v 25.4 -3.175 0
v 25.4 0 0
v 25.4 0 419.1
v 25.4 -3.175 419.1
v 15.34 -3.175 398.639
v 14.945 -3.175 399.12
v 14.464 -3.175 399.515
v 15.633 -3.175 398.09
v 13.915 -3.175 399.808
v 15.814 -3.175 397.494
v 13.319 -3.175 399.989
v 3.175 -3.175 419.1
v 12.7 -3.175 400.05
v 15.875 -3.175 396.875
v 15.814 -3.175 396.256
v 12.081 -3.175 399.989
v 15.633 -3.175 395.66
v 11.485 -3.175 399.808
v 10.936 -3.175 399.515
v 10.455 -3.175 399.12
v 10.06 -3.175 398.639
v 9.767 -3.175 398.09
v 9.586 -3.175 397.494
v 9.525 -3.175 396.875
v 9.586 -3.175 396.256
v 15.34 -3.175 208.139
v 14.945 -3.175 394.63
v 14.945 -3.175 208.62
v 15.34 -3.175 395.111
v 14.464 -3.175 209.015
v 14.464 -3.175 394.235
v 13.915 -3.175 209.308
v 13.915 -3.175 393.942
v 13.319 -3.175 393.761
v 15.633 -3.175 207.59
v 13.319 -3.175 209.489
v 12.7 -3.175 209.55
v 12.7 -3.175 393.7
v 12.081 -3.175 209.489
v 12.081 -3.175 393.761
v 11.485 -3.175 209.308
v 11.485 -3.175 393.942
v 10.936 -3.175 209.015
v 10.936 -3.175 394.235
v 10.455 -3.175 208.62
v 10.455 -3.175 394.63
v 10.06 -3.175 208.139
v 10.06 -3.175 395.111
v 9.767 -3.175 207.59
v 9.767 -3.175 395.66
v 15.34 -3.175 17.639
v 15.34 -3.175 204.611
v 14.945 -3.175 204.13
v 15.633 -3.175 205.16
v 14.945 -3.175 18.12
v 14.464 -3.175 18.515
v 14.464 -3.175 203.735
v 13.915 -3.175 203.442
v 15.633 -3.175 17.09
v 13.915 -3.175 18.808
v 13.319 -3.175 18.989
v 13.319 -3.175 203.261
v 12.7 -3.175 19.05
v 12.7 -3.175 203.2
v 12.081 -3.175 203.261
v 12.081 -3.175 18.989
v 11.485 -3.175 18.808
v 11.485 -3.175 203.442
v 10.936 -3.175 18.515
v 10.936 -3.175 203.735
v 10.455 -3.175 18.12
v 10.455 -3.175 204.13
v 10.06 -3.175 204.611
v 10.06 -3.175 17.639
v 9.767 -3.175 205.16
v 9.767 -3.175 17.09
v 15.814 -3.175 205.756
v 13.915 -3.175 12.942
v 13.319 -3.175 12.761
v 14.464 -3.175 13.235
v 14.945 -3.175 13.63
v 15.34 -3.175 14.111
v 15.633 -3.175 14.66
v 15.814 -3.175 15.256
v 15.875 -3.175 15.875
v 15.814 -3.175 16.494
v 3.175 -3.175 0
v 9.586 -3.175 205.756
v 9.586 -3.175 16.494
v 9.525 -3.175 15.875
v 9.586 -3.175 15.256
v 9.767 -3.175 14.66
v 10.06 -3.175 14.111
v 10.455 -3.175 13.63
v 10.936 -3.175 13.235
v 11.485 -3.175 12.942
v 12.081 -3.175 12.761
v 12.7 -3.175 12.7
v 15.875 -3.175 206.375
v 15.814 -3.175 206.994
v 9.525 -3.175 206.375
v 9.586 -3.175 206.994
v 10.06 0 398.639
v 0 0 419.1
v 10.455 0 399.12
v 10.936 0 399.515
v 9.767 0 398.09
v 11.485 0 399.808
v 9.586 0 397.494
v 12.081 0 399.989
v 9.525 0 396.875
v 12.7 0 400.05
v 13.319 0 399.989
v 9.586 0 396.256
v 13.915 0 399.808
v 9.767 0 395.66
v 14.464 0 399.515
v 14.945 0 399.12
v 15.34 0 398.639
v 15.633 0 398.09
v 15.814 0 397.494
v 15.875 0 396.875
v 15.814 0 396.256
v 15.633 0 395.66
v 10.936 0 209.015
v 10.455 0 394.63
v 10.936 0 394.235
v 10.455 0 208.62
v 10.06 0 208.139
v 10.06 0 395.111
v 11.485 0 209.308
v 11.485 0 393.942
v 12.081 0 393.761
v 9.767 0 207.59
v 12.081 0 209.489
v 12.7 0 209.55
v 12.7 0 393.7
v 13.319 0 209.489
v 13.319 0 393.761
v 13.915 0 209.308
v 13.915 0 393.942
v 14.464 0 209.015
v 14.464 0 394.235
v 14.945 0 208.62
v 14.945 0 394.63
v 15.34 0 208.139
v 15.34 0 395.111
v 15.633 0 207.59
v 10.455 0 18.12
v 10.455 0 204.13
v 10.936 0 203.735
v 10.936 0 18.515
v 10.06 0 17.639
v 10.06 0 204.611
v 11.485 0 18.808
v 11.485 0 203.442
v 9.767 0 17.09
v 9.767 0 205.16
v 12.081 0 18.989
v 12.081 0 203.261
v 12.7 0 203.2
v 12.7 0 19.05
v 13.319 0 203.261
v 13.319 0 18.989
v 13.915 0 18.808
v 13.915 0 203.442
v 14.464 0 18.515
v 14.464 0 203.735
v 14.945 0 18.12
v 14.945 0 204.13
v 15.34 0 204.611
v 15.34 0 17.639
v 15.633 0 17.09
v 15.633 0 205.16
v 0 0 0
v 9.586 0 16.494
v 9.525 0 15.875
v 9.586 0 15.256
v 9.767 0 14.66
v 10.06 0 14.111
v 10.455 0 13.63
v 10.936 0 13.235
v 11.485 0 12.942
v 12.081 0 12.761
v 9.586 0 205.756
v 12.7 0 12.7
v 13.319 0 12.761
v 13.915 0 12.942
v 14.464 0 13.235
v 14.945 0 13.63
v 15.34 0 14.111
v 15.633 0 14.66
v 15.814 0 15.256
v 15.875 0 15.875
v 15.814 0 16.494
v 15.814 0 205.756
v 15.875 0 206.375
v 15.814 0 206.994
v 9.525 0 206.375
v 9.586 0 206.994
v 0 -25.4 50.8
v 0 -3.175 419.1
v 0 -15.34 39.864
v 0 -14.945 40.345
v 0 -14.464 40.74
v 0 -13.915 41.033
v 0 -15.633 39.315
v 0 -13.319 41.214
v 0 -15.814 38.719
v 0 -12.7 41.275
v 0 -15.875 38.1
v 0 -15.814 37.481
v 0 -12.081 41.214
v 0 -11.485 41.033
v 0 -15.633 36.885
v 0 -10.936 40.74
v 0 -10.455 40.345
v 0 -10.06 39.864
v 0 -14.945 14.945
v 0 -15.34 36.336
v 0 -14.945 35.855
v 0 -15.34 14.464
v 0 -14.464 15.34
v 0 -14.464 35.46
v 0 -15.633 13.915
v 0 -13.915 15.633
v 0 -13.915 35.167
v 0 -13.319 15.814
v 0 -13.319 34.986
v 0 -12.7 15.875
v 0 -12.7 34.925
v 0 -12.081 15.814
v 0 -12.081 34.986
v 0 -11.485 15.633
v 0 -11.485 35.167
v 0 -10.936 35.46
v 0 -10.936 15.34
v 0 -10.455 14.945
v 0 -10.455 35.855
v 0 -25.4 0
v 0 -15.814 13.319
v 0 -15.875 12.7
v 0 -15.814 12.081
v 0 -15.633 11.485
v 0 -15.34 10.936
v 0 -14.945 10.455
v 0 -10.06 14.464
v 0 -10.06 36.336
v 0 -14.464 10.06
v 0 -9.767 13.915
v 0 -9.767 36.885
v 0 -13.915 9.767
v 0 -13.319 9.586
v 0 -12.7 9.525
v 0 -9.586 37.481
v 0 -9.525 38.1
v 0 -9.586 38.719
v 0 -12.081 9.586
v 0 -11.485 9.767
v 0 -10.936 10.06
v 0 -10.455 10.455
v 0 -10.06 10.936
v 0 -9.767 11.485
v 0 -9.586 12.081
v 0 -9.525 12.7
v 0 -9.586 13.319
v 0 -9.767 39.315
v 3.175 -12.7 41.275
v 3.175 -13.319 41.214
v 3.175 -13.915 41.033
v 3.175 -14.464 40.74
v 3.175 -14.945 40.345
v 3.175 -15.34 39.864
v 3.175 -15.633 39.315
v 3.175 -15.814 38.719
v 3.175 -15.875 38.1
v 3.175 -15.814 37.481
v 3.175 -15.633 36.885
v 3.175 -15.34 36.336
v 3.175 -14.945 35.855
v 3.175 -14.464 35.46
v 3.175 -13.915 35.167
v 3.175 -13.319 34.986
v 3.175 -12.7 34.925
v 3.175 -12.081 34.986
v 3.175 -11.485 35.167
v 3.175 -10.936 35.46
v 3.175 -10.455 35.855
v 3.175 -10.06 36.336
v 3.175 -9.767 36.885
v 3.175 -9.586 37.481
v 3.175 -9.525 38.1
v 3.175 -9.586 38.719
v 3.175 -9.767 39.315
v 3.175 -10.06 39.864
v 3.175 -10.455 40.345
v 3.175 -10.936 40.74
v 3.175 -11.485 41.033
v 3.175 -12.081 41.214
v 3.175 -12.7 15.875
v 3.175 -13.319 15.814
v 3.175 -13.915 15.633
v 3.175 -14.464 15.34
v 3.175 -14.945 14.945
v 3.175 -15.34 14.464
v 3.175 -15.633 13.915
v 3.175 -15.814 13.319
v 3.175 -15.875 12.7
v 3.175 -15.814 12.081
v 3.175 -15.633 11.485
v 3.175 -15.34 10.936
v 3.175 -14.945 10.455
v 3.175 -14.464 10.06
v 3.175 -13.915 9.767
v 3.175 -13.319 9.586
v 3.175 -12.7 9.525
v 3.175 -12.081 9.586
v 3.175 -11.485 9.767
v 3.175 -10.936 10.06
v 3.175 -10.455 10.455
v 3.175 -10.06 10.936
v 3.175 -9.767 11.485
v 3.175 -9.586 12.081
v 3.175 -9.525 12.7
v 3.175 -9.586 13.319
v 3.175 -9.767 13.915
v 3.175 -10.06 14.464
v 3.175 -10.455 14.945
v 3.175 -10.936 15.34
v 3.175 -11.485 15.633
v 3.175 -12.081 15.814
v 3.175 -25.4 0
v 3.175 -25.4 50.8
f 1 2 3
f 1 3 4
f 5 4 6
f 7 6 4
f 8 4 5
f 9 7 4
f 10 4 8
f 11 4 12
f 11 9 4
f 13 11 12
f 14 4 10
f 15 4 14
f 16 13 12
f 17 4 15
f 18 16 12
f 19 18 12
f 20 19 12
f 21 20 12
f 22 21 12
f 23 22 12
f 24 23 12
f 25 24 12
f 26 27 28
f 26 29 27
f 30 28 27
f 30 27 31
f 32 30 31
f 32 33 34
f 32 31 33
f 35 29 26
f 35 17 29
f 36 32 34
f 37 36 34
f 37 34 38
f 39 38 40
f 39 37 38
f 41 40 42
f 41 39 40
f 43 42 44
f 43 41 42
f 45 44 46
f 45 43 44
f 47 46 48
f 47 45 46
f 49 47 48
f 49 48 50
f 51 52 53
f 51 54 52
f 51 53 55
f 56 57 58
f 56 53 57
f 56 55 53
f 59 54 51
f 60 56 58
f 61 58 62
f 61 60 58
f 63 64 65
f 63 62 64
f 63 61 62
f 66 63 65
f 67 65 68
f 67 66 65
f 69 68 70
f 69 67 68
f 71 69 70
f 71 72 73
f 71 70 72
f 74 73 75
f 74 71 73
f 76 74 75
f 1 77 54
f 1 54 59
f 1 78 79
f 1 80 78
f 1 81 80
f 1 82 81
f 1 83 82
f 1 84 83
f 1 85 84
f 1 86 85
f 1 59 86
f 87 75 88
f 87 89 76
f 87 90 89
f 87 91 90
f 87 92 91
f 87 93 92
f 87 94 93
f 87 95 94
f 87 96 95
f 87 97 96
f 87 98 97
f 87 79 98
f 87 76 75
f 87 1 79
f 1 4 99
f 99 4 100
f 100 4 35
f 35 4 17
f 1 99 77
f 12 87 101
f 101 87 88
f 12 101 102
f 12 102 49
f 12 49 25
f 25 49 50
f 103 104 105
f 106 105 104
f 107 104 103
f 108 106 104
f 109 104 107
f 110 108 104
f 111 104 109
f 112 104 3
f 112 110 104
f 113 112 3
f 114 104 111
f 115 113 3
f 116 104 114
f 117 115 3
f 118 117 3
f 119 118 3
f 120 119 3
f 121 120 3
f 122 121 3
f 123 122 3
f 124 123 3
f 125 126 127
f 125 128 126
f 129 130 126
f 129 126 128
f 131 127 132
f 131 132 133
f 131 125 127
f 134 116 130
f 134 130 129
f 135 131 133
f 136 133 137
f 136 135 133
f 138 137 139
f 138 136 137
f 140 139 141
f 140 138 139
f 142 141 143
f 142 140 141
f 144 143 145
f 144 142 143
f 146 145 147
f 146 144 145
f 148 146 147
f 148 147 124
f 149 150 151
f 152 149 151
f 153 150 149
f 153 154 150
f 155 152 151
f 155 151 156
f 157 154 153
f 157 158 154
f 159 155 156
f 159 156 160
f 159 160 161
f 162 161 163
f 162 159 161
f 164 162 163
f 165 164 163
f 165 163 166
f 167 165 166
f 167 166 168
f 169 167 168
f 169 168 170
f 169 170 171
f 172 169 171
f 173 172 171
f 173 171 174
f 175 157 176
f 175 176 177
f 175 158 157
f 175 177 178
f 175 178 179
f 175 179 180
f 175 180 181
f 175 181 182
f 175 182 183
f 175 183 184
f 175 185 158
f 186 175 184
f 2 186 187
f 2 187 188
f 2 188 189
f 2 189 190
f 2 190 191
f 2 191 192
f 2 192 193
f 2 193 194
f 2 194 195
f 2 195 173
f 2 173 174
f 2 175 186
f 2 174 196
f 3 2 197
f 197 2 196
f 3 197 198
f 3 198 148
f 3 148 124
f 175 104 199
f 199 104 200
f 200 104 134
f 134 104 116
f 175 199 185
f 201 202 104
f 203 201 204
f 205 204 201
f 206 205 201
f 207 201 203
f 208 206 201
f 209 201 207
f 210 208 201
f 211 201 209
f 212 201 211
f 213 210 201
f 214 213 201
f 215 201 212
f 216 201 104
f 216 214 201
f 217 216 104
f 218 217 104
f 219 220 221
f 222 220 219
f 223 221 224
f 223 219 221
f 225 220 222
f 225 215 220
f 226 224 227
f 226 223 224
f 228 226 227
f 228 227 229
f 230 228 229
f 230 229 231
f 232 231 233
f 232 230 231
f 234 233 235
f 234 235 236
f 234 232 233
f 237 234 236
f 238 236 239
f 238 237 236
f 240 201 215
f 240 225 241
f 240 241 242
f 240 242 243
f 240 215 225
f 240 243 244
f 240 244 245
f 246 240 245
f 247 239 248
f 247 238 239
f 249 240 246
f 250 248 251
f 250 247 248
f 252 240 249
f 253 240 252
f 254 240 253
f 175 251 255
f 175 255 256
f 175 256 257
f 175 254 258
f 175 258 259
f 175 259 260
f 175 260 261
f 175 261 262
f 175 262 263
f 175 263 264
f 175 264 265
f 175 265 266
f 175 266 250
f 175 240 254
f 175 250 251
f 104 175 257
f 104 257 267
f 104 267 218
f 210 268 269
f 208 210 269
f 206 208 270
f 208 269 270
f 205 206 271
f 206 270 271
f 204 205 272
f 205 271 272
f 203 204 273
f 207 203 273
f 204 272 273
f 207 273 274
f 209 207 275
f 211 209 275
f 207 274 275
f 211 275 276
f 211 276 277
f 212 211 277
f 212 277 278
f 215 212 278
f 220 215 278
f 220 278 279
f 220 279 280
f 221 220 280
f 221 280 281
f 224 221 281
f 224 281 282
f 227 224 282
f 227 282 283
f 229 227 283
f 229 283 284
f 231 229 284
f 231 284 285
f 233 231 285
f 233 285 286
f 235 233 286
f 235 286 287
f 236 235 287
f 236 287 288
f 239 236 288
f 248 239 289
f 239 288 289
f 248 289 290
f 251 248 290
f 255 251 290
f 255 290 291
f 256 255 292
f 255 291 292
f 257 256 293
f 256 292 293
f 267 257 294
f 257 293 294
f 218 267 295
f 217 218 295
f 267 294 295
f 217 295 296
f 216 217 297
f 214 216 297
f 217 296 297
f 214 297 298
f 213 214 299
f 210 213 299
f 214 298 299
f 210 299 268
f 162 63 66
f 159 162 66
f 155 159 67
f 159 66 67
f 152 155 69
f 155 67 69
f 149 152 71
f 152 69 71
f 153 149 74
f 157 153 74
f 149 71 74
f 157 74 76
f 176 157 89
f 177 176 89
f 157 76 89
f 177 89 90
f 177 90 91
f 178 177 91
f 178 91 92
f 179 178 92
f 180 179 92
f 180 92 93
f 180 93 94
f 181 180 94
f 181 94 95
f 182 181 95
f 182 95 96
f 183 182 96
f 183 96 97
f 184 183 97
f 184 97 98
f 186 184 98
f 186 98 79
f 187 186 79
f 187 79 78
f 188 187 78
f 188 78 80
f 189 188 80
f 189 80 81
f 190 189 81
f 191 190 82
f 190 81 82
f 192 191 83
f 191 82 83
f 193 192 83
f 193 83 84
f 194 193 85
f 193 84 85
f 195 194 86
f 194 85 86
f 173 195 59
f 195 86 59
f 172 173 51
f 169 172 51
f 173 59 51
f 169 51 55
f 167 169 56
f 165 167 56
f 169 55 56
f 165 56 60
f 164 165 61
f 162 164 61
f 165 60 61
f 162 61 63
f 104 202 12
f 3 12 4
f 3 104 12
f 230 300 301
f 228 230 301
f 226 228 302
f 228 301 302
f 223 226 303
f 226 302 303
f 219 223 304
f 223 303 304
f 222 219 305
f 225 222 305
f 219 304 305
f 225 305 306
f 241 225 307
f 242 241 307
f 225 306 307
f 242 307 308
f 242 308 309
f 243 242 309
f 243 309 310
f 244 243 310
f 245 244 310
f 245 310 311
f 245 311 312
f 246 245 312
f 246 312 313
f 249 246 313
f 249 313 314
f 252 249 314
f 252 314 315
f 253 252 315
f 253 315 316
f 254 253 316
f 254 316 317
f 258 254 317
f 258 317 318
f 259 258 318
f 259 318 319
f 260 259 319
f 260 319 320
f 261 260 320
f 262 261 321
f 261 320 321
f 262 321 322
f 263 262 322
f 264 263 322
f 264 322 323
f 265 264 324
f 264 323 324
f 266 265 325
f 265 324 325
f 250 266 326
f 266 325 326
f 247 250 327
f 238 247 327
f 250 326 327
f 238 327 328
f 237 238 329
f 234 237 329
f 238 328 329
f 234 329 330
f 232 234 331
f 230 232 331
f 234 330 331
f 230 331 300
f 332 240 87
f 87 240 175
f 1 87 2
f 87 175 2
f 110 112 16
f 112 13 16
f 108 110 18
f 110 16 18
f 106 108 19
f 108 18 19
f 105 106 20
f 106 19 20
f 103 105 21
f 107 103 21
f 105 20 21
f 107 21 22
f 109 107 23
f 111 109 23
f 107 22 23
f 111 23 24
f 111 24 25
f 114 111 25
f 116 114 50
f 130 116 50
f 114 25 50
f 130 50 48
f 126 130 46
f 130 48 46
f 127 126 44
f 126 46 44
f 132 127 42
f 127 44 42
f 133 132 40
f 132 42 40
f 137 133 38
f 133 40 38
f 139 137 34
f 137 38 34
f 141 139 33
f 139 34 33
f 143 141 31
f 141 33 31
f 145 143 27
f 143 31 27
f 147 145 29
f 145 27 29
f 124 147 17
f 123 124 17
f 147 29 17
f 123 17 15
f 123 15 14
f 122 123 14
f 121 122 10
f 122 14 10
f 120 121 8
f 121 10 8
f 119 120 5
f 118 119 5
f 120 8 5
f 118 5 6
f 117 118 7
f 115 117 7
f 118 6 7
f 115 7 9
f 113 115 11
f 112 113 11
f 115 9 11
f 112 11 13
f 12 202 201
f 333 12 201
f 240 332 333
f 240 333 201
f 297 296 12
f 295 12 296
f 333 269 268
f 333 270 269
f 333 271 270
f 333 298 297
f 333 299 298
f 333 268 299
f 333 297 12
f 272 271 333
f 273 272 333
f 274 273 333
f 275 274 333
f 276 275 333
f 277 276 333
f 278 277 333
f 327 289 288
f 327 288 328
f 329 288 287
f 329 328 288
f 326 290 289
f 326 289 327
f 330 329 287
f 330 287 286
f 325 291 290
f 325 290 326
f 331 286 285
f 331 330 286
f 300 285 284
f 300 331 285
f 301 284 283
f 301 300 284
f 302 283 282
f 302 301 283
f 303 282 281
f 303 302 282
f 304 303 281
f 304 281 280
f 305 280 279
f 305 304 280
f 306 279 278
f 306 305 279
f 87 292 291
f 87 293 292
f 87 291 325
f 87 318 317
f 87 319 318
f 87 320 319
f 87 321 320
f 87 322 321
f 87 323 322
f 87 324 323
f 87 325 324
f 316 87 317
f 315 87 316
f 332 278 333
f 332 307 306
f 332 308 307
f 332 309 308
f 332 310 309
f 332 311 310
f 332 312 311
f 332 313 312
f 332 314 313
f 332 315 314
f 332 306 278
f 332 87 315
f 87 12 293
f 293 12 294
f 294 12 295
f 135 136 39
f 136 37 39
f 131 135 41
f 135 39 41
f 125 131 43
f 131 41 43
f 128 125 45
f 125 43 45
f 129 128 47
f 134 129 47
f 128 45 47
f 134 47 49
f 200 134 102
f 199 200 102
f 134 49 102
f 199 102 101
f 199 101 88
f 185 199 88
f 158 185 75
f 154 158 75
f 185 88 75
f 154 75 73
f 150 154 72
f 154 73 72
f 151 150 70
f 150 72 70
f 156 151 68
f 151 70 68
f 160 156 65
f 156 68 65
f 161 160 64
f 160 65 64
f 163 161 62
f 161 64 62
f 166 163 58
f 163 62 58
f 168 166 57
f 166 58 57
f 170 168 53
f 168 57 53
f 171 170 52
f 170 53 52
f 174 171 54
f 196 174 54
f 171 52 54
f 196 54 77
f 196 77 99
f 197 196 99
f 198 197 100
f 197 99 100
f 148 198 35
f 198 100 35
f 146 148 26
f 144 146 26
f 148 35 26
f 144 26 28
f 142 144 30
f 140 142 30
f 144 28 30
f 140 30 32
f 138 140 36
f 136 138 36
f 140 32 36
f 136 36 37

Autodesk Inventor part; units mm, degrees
ref_plane "YZ Plane" through (0, 0, 0) normal (1, 0, 0) x (0, 1, 0)
ref_plane "XZ Plane" through (0, 0, 0) normal (0, 1, 0) x (-1, 0, 0)
ref_plane "XY Plane" through (0, 0, 0) normal (0, 0, 1) x (1, 0, 0)
sketch "Sketch1" plane through (0, 0, 0) normal (0, 0, 1) x (1, 0, 0)
  line L0 (0, 0) -> (25.4, 0)
  line L1 (25.4, 0) -> (25.4, -3.175)
  line L2 (25.4, -3.175) -> (0, -3.175)
  line L3 (0, -3.175) -> (0, 0)
  line L4 (0, 0) -> (3.175, 0)
  line L5 (3.175, 0) -> (3.175, -25.4)
  line L6 (3.175, -25.4) -> (0, -25.4)
  line L7 (0, -25.4) -> (0, 0)
  dimension "d0" = 25.4
  dimension "d1" = 3.175
  dimension "d2" = 3.175
  dimension "d3" = 25.4
extrude "Extrusion1" add sketch "Sketch1" along normal blind 419.1
sketch "Sketch2" plane through (0, -25.4, 0) normal (-1, 0, 0) x (0, 0, 1)
  line L0 (419.1, 25.4) -> (419.1, 0) projected
  line L1 (0, 25.4) -> (419.1, 25.4) projected
  line L2 (0, 25.4) -> (0, 0) projected
  line L3 (0, 0) -> (419.1, 0) projected
  line L4 (0, 0) -> (50.8, 0) construction
  line L5 (0, 0) -> (419.1, 0) construction
  line L6 (419.1, 25.4) -> (419.1, 22.225) construction
  line L7 (419.1, 0) -> (419.1, 22.225) construction
  line L8 (419.1, 22.225) -> (50.8, 0)
  line L9 (50.8, 0) -> (419.1, 0)
  line L10 (419.1, 22.225) -> (0, 22.225) projected
  line L11 (419.1, 0) -> (419.1, 22.225)
  dimension "d6" = 50.8
  dimension "d7" = 3.175
extrude "Extrusion2" cut sketch "Sketch2" against normal blind 431.8 contours L0 L3 L8
sketch "Sketch3" plane through (0, -25.4, 0) normal (-1, 0, 0) x (0, 0, 1)
  line L0 (50.8, 0) -> (419.1, 22.225) projected
  line L1 (419.1, 25.4) -> (419.1, 22.225) projected
  line L2 (0, 25.4) -> (419.1, 25.4) projected
  line L3 (0, 25.4) -> (0, 0) projected
  line L4 (0, 0) -> (50.8, 0) projected
  point P0 (12.7, 12.7)
  point P1 (38.1, 12.7)
  dimension "d10" = 12.7
  dimension "d11" = 12.7
  dimension "d12" = 38.1
  dimension "d13" = 12.7
hole "Hole1" at (0, -12.7, 12.7) at (0, -12.7, 38.1) direction (1, 0, 0) diameter 6.35 end through all
sketch "Sketch4" plane through (0, 0, 0) normal (0, 1, 0) x (1, 0, 0)
  line L0 (25.4, 0) -> (0, 0) projected
  line L1 (0, 0) -> (0, -419.1) projected
  line L2 (25.4, -419.1) -> (0, -419.1) projected
  line L3 (25.4, 0) -> (25.4, -419.1) projected
  point P0 (12.7, -15.875)
  point P1 (12.7, -206.375)
  point P2 (12.7, -396.875)
  dimension "d21" = 12.7
  dimension "d22" = 15.875
  dimension "d23" = 206.375
  dimension "d24" = 12.7
  dimension "d25" = 12.7
  dimension "d26" = 22.225
hole "Hole2" at (12.7, 0, 15.875) at (12.7, 0, 206.375) at (12.7, 0, 396.875) direction (0, -1, 0) diameter 6.35 end through all
properties part number "1x1 lengthwise left"
